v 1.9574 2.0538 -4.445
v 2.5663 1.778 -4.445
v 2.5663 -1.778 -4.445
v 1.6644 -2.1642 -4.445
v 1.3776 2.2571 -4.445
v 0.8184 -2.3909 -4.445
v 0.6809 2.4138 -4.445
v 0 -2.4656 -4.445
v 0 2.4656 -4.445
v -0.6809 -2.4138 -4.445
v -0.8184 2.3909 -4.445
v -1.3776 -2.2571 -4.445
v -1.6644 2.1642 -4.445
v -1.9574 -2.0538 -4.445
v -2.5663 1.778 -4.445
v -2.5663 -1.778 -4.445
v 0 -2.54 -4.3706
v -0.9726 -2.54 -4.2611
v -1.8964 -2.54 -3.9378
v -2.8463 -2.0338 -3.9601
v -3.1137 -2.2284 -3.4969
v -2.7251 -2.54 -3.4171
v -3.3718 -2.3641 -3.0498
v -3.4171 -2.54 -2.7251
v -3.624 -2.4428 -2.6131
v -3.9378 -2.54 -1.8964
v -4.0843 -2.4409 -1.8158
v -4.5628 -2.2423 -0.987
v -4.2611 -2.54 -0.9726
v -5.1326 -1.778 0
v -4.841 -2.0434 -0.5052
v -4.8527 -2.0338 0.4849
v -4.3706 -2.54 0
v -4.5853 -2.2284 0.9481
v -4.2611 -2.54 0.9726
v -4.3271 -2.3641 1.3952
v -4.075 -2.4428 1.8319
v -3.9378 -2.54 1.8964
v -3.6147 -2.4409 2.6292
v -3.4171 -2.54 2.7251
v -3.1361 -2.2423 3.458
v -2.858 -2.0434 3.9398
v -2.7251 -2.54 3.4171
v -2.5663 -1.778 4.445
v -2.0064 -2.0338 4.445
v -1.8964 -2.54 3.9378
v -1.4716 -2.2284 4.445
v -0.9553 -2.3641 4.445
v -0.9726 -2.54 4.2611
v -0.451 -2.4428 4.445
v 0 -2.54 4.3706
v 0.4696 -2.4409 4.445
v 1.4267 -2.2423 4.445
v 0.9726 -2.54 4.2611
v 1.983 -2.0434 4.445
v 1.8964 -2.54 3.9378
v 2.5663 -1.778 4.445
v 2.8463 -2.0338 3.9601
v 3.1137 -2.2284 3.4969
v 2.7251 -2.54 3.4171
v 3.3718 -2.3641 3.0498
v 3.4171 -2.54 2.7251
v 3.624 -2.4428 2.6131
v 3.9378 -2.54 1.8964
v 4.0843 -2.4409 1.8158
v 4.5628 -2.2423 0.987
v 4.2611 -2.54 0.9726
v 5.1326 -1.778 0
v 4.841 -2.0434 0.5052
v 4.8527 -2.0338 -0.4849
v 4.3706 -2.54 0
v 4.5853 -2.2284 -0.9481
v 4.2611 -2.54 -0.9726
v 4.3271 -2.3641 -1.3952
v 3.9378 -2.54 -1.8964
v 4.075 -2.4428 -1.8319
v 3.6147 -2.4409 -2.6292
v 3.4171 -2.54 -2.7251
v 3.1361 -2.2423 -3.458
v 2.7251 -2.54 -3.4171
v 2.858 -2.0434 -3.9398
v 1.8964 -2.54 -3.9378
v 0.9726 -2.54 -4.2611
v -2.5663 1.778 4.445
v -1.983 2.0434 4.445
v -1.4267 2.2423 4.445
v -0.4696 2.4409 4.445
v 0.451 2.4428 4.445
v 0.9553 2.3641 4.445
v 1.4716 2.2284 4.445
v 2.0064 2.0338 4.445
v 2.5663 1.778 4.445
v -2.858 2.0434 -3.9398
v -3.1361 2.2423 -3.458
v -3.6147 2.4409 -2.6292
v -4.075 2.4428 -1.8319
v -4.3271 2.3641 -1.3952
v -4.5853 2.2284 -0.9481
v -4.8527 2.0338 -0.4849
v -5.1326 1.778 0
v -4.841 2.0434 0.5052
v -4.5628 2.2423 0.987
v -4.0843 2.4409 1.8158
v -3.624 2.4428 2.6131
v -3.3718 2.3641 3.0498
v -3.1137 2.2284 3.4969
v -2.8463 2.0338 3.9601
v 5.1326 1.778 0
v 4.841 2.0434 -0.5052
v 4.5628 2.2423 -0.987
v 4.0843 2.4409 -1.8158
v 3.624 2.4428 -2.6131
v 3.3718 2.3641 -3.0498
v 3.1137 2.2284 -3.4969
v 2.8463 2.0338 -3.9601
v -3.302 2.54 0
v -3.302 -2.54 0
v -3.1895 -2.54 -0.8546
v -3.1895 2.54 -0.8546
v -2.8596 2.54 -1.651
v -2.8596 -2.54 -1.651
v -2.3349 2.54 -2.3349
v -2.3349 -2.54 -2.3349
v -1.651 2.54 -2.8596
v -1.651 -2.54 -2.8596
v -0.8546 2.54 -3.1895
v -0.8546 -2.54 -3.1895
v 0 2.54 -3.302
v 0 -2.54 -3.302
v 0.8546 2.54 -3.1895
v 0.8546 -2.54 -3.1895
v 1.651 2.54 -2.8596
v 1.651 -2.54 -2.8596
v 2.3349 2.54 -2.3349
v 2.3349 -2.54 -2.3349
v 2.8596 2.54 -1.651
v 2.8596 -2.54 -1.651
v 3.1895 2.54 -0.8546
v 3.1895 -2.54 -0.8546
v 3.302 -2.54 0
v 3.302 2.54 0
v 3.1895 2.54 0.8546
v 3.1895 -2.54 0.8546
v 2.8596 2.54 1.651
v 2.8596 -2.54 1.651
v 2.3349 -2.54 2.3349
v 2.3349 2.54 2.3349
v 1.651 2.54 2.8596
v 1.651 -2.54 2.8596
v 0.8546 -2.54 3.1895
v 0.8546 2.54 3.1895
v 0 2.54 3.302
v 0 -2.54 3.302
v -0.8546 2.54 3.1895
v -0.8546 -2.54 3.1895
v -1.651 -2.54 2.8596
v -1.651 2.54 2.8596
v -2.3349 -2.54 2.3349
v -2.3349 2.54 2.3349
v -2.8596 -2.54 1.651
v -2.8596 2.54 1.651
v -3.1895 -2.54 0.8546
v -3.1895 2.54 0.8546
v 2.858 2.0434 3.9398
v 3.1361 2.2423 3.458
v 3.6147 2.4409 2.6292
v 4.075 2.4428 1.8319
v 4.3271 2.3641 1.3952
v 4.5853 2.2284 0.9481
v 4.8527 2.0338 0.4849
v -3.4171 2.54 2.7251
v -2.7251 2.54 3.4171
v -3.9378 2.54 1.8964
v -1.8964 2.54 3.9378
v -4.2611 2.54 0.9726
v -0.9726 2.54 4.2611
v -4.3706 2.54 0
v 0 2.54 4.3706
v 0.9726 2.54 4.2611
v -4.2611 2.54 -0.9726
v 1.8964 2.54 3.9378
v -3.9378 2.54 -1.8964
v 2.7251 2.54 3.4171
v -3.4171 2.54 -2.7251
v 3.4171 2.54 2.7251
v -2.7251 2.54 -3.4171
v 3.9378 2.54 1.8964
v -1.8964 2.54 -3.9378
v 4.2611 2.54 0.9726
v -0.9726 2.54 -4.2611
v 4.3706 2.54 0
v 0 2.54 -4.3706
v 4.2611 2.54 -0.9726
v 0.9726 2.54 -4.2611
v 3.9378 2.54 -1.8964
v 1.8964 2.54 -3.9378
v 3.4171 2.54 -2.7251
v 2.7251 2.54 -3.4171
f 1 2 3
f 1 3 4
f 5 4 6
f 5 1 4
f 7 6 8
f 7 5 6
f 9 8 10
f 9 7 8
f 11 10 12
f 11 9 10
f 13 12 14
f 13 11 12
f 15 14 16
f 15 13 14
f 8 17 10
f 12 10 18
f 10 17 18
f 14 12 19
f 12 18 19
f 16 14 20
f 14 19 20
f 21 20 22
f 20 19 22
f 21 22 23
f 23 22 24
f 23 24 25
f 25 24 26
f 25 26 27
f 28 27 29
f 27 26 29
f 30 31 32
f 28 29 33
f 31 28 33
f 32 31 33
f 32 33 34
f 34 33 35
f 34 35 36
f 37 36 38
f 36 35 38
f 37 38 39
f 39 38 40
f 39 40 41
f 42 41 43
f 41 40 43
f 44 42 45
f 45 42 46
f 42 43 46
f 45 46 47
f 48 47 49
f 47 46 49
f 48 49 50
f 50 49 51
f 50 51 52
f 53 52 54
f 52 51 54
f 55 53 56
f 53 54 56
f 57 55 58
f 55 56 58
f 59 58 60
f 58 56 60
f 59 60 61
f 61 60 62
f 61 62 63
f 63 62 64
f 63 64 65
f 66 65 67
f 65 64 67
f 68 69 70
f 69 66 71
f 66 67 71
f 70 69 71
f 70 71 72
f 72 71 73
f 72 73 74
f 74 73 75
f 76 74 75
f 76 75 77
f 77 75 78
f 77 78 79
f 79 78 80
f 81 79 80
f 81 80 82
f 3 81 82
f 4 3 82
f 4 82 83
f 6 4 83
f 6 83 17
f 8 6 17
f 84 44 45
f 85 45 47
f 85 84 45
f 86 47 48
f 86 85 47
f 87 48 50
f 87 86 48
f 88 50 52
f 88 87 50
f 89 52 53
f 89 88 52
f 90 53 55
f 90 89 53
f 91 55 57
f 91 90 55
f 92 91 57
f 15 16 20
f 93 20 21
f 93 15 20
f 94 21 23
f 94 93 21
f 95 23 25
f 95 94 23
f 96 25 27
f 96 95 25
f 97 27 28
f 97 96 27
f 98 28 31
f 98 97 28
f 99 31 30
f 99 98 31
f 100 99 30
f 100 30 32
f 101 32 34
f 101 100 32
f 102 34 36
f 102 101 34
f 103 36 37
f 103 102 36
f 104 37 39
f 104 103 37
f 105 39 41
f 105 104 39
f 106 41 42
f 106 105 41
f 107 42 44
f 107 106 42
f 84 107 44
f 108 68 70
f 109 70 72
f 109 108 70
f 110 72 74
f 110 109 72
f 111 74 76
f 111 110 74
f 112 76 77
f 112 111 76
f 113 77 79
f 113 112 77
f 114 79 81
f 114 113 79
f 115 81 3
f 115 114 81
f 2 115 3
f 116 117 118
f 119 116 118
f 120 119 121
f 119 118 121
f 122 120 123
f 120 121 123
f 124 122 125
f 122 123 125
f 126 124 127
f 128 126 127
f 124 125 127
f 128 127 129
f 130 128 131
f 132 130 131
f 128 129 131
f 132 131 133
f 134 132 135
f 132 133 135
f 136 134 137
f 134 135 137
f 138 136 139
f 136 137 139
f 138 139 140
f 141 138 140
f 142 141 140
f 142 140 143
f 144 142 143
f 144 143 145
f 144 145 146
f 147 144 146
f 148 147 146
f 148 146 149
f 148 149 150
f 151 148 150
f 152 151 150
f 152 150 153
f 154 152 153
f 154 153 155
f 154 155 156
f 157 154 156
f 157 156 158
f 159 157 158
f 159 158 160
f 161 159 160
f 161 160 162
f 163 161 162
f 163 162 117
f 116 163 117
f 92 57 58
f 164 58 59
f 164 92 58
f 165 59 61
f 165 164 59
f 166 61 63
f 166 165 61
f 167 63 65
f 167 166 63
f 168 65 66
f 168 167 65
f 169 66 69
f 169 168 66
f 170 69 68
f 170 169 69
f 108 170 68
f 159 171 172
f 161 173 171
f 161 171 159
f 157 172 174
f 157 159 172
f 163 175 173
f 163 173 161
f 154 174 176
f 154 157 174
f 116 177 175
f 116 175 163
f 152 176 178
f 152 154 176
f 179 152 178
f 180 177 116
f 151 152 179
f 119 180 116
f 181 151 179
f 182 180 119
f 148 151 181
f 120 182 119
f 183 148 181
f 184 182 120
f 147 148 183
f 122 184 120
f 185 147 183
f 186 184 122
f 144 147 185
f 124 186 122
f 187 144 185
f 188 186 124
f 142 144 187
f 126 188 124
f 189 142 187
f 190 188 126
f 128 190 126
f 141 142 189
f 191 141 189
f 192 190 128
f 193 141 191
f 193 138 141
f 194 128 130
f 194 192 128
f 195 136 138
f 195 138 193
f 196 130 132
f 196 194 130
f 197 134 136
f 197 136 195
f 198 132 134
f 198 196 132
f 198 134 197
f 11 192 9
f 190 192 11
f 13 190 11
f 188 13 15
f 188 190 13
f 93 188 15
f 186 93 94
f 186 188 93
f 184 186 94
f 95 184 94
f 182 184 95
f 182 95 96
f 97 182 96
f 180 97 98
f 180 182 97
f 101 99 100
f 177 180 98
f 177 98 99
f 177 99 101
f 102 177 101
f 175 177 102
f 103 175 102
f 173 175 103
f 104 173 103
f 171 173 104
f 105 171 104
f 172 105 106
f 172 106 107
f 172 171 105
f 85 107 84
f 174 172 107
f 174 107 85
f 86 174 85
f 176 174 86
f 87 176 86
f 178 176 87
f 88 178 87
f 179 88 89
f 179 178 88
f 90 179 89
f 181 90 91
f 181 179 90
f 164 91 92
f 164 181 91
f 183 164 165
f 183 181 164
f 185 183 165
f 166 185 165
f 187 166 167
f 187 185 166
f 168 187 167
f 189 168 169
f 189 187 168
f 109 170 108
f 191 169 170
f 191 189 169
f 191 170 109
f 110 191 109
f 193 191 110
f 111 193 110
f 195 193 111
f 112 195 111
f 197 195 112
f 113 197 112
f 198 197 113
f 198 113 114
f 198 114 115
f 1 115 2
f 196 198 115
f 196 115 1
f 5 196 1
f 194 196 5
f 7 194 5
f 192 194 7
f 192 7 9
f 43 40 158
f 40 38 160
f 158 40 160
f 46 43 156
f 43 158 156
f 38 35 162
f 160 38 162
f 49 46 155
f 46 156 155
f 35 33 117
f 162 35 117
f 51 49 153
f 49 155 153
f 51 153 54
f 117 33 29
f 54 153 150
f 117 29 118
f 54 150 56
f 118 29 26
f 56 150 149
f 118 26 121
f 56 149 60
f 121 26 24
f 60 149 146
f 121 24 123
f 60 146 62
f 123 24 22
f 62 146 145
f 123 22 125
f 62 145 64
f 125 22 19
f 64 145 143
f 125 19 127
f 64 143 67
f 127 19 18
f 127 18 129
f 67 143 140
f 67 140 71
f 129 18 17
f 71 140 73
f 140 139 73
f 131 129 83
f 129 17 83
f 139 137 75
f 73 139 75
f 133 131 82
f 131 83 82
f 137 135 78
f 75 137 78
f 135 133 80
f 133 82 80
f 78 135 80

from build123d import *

# Parameters (mm, degrees)
BOSS_EXTRUDE1_DEPTH = 2.54
HOLE1_D             = 6.604


with BuildPart() as part:
    # Sketch2 → Boss-Extrude1 (new, symmetric)
    with BuildSketch(Plane(origin=(0, 0, 0), x_dir=(1, 0, 0), z_dir=(0, 1, 0))):
        Polygon((5.132643893, 0), (2.566321947, 4.445), (-2.566321947, 4.445), (-5.132643893, 0), (-2.566321947, -4.445), (2.566321947, -4.445), align=None)
    extrude(amount=BOSS_EXTRUDE1_DEPTH, both=True)

    # Sketch3 → Cut-Revolve1 (revolve, cut)
    with BuildSketch(Plane.XY, mode=Mode.PRIVATE) as cut_revolve1_sk:
        Polygon((4.370643893, 2.54), (5.132643893, 2.54), (5.132643893, 1.778), align=None)
    cut_revolve1 = revolve(cut_revolve1_sk.sketch.rotate(Axis((0, 0, 0), (0, 1, 0)), 90), axis=Axis((0, 0, 0), (0, 1, 0)), mode=Mode.SUBTRACT)

    # Hole1 (through all)
    with Locations(Plane(origin=(0, 2.54, 0), x_dir=(1, 0, 0), z_dir=(0, 1, 0))):
        with Locations((0, 0)):
            Hole(HOLE1_D / 2)

    # Mirror1: Cut-Revolve1 across plane
    add(cut_revolve1.mirror(Plane.ZX), mode=Mode.SUBTRACT)


solid = part.part
